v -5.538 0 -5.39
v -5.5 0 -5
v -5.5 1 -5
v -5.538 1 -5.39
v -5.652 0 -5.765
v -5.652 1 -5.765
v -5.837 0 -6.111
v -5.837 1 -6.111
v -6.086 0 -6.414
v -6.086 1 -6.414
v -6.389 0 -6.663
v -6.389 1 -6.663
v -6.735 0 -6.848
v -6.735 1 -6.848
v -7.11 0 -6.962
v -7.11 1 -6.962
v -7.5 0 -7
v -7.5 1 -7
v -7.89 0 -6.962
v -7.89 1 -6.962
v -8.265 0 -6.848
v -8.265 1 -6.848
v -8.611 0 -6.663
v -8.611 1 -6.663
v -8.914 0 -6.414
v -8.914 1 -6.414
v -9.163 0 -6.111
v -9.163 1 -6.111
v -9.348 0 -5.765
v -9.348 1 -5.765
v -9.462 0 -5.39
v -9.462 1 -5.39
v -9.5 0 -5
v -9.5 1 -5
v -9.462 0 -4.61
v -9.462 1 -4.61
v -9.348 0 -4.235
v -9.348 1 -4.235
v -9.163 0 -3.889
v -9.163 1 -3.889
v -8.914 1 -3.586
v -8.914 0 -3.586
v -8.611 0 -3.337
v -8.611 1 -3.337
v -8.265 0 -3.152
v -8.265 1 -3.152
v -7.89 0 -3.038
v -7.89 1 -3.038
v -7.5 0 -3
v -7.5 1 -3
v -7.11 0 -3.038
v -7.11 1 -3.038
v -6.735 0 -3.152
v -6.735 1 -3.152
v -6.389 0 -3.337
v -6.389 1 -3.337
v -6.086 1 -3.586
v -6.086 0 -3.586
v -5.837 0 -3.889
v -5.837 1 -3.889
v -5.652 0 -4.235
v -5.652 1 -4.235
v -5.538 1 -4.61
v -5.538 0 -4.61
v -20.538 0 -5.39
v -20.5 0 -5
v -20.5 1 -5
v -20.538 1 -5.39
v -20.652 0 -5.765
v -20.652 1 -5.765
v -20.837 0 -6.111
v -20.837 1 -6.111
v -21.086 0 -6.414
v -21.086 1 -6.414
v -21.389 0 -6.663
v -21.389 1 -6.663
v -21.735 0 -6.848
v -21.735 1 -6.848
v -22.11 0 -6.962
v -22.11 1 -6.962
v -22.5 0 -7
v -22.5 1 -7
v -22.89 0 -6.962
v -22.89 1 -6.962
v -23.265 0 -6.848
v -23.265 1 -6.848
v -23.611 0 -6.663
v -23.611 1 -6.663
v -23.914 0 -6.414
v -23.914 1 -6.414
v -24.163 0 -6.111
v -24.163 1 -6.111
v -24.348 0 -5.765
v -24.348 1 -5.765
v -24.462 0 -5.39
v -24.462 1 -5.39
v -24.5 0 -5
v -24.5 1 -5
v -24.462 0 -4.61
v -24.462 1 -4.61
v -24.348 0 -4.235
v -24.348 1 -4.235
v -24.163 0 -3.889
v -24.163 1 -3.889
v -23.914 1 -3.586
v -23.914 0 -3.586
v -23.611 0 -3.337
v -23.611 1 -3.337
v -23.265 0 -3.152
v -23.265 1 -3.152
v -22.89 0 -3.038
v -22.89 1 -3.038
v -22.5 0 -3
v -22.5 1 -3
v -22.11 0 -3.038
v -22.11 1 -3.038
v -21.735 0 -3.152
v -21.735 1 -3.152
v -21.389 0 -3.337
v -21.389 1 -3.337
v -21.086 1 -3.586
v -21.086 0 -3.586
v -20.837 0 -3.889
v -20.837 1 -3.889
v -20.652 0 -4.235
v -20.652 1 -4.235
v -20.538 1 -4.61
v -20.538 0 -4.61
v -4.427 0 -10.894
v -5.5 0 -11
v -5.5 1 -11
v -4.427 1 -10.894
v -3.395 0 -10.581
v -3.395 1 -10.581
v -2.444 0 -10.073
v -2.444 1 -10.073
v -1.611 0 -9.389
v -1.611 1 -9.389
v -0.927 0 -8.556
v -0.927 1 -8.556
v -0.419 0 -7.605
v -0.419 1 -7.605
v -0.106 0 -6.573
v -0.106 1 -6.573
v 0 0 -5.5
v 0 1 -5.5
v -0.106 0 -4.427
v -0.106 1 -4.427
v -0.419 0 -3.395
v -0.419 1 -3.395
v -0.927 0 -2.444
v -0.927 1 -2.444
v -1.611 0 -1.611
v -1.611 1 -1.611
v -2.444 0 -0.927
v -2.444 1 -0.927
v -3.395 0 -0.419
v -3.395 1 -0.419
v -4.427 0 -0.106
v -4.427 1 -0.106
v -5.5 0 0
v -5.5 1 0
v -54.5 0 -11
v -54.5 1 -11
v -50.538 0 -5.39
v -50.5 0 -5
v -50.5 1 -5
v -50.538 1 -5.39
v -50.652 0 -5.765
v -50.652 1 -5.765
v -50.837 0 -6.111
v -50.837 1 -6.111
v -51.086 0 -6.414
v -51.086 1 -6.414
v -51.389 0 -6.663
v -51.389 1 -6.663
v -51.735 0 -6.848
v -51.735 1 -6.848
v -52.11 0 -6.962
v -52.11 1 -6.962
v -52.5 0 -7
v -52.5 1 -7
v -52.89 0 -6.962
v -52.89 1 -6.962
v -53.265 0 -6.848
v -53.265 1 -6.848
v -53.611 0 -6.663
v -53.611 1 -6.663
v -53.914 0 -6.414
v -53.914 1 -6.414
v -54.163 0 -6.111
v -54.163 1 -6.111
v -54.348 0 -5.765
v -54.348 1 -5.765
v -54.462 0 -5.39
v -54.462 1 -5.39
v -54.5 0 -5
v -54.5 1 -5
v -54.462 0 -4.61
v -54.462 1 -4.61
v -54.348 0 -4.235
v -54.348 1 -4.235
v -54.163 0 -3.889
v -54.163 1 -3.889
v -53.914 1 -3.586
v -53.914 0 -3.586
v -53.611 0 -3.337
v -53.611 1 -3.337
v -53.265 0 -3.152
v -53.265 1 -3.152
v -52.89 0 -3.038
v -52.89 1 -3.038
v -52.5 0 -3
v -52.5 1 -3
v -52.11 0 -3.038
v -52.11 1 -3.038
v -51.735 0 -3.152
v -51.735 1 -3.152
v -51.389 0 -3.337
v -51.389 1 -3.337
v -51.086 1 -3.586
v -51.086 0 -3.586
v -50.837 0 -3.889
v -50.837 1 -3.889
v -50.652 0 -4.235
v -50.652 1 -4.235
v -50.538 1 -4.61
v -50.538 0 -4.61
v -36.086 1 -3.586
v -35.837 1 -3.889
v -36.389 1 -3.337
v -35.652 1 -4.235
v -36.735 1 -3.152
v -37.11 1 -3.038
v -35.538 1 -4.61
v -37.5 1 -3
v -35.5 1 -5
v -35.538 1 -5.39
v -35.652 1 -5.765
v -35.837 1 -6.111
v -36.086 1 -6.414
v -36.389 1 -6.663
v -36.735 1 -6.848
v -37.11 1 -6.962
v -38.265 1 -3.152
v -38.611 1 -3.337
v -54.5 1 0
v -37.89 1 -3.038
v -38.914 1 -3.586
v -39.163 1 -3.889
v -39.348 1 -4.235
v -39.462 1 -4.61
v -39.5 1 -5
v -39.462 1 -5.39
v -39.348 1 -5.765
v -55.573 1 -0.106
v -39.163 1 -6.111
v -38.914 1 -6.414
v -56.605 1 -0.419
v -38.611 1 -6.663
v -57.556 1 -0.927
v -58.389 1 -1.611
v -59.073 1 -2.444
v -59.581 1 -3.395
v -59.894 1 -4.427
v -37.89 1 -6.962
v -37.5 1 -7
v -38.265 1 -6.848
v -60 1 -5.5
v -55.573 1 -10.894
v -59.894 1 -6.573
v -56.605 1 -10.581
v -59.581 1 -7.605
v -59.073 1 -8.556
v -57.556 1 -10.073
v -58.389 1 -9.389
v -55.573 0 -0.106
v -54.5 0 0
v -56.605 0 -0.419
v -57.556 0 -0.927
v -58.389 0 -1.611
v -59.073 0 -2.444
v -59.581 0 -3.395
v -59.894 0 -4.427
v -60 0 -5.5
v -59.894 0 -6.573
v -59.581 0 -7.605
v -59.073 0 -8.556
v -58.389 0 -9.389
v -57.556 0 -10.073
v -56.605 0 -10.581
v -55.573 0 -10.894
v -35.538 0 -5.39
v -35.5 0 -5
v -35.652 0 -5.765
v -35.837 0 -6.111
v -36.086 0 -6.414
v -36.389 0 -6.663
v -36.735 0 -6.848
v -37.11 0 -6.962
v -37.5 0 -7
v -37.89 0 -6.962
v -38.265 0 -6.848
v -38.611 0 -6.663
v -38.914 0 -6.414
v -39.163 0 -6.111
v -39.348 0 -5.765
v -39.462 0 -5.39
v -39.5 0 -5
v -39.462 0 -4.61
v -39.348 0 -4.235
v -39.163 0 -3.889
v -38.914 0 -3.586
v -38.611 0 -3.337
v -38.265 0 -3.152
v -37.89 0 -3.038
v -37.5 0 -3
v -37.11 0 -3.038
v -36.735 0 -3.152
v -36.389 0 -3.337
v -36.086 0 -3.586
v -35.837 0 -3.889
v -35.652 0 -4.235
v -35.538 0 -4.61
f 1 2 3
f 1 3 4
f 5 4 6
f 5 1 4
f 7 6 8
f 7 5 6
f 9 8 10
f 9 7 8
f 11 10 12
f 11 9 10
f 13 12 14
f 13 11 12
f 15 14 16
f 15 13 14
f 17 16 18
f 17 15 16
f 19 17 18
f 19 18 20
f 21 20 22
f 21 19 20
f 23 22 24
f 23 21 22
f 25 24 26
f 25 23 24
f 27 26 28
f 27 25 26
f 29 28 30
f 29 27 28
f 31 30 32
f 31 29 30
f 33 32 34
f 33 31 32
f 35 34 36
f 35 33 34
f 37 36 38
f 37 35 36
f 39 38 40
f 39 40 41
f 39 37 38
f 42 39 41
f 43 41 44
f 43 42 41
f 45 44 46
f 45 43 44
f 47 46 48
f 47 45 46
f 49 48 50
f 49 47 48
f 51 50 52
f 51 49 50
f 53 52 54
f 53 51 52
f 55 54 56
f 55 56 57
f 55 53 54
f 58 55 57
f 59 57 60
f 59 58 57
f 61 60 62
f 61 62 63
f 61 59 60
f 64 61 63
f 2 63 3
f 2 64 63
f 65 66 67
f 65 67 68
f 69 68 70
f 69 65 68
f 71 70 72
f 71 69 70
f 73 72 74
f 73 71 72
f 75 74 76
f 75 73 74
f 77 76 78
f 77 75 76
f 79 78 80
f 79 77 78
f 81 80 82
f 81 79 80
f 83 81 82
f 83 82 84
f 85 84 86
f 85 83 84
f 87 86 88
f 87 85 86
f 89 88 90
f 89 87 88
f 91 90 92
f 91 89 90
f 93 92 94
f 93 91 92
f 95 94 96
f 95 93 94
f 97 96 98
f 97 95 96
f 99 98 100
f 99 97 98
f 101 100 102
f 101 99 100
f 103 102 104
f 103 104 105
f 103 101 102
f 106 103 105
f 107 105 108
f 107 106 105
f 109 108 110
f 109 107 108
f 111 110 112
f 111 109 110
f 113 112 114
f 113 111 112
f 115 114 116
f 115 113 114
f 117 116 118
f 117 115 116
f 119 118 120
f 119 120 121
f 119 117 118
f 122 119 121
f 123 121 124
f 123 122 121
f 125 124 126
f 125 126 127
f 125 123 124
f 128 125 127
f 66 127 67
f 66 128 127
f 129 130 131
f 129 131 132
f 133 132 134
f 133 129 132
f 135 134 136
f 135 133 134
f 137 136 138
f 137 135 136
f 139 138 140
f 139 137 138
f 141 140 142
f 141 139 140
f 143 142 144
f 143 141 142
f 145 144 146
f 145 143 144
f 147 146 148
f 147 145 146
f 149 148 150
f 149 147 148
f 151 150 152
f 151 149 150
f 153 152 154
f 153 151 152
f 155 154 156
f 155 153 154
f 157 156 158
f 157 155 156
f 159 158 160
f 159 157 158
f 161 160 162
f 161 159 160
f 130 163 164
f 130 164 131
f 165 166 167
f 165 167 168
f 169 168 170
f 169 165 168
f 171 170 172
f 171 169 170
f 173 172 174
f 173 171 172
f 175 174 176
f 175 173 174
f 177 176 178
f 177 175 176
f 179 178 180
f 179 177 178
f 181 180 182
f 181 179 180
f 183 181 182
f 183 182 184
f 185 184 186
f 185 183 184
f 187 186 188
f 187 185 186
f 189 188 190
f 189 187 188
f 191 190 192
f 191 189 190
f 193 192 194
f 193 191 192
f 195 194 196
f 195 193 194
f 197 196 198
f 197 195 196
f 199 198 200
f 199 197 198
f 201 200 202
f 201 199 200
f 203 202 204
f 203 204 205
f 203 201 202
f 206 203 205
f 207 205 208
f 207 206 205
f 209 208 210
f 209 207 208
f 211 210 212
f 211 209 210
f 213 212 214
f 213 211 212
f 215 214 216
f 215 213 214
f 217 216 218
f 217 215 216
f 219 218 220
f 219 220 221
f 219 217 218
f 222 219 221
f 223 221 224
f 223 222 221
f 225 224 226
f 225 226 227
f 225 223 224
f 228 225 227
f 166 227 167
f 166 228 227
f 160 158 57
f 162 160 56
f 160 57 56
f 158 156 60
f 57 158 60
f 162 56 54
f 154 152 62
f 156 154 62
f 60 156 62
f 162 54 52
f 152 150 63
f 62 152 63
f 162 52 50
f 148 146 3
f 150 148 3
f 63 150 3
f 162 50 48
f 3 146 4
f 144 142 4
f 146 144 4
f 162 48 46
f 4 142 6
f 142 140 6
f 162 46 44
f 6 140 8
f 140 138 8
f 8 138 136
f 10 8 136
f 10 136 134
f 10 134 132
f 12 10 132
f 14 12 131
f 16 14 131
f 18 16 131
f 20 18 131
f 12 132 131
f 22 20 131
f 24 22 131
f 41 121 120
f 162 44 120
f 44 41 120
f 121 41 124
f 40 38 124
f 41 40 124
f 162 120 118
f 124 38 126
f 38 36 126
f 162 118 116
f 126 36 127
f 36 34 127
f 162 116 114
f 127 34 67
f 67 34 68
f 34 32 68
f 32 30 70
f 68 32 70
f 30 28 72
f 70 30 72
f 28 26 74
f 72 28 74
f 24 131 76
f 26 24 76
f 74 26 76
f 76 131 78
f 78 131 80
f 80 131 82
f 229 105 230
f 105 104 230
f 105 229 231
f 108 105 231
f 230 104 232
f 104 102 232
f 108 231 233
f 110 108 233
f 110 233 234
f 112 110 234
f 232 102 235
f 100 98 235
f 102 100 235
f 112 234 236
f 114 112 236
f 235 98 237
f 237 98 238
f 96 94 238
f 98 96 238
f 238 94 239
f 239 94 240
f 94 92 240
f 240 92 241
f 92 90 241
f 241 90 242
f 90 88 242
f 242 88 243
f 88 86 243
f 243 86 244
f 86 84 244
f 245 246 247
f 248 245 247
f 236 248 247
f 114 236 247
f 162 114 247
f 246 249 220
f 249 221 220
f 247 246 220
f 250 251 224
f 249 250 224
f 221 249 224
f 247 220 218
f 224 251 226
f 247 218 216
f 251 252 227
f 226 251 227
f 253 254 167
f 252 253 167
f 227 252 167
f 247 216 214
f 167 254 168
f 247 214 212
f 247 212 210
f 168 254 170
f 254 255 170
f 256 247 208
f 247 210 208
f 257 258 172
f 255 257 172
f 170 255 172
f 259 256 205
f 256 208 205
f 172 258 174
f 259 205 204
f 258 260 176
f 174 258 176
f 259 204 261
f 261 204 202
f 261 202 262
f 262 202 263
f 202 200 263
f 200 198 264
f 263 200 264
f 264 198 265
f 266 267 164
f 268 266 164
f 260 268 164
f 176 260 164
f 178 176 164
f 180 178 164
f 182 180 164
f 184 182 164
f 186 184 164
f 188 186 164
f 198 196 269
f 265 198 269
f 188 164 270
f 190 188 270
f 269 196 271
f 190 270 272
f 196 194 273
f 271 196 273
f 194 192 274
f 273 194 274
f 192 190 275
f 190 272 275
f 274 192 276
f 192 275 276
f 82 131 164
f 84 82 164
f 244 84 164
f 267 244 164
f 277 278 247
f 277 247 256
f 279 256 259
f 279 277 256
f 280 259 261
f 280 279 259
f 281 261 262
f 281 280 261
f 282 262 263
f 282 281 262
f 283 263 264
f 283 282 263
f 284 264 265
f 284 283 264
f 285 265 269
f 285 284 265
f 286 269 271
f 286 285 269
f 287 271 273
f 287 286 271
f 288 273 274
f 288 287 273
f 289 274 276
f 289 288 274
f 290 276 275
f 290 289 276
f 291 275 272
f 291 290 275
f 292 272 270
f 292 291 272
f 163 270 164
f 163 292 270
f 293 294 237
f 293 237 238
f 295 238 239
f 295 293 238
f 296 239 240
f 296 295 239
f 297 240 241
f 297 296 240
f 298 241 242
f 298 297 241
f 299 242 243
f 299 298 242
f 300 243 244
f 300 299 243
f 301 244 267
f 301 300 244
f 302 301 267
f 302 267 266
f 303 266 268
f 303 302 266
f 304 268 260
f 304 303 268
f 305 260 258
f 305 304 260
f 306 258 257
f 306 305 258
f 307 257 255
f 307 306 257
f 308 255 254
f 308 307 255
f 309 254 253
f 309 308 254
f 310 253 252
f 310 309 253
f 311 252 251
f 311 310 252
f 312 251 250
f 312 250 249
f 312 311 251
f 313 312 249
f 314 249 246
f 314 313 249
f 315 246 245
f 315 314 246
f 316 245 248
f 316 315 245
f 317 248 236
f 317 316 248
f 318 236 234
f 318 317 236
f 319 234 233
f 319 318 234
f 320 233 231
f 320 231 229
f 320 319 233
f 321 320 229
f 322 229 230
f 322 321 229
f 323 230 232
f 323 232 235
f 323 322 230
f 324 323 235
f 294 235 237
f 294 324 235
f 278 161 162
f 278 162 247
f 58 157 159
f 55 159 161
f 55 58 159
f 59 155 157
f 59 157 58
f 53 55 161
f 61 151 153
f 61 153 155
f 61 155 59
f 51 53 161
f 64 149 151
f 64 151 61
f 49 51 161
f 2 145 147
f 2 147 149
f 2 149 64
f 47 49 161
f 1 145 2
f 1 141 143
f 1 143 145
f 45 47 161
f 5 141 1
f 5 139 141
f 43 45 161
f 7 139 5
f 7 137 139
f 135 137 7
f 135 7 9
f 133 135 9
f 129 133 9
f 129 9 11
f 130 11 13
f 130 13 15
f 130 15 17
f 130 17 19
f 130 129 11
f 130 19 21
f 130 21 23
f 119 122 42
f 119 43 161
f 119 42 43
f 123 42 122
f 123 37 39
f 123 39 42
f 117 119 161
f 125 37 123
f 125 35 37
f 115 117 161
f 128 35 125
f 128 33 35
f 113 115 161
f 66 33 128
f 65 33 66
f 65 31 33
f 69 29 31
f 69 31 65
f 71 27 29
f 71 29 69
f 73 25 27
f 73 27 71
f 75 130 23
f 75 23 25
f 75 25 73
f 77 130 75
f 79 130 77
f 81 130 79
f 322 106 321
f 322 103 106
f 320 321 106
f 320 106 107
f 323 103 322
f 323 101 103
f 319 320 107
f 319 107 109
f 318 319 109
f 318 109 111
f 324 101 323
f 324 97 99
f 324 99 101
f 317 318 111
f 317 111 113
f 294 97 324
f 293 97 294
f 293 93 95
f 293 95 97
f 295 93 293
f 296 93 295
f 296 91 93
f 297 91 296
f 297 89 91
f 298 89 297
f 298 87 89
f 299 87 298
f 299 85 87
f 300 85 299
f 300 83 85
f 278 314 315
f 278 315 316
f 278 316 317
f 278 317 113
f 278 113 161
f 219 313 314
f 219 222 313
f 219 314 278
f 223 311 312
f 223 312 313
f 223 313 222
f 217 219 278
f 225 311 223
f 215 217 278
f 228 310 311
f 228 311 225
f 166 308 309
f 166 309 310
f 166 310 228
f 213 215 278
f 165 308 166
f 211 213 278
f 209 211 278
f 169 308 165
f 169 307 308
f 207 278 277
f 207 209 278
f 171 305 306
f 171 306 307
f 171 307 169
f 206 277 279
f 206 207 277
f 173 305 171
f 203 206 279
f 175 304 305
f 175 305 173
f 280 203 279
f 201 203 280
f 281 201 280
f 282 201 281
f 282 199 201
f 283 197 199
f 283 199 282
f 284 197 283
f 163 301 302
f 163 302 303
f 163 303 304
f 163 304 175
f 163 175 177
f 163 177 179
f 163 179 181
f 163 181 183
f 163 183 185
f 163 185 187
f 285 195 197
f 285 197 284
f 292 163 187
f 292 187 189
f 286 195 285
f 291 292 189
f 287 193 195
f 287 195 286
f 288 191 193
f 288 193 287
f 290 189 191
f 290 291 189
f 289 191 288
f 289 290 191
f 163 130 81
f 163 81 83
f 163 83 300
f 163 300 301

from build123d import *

# Parameters (mm, degrees)
SKETCH1_R           = 2
BOSS_EXTRUDE1_DEPTH = 1


with BuildPart() as part:
    # Sketch1 → Boss-Extrude1 (new body)
    with BuildSketch(Plane(origin=(0, 0, 0), x_dir=(1, 0, 0), z_dir=(0, 1, 0))):
        with BuildLine():
            Line((-5.5, 0), (-54.5, 0))
            ThreePointArc((-54.5, 0), (-60, 5.5), (-54.5, 11))
            Line((-54.5, 11), (-5.5, 11))
            ThreePointArc((-5.5, 11), (0, 5.5), (-5.5, 0))
        make_face()
        with Locations((-52.5, 5)):
            Circle(SKETCH1_R, mode=Mode.SUBTRACT)
        with Locations((-37.5, 5)):
            Circle(SKETCH1_R, mode=Mode.SUBTRACT)
        with Locations((-22.5, 5)):
            Circle(SKETCH1_R, mode=Mode.SUBTRACT)
        with Locations((-7.5, 5)):
            Circle(SKETCH1_R, mode=Mode.SUBTRACT)
    extrude(amount=BOSS_EXTRUDE1_DEPTH)


solid = part.part
